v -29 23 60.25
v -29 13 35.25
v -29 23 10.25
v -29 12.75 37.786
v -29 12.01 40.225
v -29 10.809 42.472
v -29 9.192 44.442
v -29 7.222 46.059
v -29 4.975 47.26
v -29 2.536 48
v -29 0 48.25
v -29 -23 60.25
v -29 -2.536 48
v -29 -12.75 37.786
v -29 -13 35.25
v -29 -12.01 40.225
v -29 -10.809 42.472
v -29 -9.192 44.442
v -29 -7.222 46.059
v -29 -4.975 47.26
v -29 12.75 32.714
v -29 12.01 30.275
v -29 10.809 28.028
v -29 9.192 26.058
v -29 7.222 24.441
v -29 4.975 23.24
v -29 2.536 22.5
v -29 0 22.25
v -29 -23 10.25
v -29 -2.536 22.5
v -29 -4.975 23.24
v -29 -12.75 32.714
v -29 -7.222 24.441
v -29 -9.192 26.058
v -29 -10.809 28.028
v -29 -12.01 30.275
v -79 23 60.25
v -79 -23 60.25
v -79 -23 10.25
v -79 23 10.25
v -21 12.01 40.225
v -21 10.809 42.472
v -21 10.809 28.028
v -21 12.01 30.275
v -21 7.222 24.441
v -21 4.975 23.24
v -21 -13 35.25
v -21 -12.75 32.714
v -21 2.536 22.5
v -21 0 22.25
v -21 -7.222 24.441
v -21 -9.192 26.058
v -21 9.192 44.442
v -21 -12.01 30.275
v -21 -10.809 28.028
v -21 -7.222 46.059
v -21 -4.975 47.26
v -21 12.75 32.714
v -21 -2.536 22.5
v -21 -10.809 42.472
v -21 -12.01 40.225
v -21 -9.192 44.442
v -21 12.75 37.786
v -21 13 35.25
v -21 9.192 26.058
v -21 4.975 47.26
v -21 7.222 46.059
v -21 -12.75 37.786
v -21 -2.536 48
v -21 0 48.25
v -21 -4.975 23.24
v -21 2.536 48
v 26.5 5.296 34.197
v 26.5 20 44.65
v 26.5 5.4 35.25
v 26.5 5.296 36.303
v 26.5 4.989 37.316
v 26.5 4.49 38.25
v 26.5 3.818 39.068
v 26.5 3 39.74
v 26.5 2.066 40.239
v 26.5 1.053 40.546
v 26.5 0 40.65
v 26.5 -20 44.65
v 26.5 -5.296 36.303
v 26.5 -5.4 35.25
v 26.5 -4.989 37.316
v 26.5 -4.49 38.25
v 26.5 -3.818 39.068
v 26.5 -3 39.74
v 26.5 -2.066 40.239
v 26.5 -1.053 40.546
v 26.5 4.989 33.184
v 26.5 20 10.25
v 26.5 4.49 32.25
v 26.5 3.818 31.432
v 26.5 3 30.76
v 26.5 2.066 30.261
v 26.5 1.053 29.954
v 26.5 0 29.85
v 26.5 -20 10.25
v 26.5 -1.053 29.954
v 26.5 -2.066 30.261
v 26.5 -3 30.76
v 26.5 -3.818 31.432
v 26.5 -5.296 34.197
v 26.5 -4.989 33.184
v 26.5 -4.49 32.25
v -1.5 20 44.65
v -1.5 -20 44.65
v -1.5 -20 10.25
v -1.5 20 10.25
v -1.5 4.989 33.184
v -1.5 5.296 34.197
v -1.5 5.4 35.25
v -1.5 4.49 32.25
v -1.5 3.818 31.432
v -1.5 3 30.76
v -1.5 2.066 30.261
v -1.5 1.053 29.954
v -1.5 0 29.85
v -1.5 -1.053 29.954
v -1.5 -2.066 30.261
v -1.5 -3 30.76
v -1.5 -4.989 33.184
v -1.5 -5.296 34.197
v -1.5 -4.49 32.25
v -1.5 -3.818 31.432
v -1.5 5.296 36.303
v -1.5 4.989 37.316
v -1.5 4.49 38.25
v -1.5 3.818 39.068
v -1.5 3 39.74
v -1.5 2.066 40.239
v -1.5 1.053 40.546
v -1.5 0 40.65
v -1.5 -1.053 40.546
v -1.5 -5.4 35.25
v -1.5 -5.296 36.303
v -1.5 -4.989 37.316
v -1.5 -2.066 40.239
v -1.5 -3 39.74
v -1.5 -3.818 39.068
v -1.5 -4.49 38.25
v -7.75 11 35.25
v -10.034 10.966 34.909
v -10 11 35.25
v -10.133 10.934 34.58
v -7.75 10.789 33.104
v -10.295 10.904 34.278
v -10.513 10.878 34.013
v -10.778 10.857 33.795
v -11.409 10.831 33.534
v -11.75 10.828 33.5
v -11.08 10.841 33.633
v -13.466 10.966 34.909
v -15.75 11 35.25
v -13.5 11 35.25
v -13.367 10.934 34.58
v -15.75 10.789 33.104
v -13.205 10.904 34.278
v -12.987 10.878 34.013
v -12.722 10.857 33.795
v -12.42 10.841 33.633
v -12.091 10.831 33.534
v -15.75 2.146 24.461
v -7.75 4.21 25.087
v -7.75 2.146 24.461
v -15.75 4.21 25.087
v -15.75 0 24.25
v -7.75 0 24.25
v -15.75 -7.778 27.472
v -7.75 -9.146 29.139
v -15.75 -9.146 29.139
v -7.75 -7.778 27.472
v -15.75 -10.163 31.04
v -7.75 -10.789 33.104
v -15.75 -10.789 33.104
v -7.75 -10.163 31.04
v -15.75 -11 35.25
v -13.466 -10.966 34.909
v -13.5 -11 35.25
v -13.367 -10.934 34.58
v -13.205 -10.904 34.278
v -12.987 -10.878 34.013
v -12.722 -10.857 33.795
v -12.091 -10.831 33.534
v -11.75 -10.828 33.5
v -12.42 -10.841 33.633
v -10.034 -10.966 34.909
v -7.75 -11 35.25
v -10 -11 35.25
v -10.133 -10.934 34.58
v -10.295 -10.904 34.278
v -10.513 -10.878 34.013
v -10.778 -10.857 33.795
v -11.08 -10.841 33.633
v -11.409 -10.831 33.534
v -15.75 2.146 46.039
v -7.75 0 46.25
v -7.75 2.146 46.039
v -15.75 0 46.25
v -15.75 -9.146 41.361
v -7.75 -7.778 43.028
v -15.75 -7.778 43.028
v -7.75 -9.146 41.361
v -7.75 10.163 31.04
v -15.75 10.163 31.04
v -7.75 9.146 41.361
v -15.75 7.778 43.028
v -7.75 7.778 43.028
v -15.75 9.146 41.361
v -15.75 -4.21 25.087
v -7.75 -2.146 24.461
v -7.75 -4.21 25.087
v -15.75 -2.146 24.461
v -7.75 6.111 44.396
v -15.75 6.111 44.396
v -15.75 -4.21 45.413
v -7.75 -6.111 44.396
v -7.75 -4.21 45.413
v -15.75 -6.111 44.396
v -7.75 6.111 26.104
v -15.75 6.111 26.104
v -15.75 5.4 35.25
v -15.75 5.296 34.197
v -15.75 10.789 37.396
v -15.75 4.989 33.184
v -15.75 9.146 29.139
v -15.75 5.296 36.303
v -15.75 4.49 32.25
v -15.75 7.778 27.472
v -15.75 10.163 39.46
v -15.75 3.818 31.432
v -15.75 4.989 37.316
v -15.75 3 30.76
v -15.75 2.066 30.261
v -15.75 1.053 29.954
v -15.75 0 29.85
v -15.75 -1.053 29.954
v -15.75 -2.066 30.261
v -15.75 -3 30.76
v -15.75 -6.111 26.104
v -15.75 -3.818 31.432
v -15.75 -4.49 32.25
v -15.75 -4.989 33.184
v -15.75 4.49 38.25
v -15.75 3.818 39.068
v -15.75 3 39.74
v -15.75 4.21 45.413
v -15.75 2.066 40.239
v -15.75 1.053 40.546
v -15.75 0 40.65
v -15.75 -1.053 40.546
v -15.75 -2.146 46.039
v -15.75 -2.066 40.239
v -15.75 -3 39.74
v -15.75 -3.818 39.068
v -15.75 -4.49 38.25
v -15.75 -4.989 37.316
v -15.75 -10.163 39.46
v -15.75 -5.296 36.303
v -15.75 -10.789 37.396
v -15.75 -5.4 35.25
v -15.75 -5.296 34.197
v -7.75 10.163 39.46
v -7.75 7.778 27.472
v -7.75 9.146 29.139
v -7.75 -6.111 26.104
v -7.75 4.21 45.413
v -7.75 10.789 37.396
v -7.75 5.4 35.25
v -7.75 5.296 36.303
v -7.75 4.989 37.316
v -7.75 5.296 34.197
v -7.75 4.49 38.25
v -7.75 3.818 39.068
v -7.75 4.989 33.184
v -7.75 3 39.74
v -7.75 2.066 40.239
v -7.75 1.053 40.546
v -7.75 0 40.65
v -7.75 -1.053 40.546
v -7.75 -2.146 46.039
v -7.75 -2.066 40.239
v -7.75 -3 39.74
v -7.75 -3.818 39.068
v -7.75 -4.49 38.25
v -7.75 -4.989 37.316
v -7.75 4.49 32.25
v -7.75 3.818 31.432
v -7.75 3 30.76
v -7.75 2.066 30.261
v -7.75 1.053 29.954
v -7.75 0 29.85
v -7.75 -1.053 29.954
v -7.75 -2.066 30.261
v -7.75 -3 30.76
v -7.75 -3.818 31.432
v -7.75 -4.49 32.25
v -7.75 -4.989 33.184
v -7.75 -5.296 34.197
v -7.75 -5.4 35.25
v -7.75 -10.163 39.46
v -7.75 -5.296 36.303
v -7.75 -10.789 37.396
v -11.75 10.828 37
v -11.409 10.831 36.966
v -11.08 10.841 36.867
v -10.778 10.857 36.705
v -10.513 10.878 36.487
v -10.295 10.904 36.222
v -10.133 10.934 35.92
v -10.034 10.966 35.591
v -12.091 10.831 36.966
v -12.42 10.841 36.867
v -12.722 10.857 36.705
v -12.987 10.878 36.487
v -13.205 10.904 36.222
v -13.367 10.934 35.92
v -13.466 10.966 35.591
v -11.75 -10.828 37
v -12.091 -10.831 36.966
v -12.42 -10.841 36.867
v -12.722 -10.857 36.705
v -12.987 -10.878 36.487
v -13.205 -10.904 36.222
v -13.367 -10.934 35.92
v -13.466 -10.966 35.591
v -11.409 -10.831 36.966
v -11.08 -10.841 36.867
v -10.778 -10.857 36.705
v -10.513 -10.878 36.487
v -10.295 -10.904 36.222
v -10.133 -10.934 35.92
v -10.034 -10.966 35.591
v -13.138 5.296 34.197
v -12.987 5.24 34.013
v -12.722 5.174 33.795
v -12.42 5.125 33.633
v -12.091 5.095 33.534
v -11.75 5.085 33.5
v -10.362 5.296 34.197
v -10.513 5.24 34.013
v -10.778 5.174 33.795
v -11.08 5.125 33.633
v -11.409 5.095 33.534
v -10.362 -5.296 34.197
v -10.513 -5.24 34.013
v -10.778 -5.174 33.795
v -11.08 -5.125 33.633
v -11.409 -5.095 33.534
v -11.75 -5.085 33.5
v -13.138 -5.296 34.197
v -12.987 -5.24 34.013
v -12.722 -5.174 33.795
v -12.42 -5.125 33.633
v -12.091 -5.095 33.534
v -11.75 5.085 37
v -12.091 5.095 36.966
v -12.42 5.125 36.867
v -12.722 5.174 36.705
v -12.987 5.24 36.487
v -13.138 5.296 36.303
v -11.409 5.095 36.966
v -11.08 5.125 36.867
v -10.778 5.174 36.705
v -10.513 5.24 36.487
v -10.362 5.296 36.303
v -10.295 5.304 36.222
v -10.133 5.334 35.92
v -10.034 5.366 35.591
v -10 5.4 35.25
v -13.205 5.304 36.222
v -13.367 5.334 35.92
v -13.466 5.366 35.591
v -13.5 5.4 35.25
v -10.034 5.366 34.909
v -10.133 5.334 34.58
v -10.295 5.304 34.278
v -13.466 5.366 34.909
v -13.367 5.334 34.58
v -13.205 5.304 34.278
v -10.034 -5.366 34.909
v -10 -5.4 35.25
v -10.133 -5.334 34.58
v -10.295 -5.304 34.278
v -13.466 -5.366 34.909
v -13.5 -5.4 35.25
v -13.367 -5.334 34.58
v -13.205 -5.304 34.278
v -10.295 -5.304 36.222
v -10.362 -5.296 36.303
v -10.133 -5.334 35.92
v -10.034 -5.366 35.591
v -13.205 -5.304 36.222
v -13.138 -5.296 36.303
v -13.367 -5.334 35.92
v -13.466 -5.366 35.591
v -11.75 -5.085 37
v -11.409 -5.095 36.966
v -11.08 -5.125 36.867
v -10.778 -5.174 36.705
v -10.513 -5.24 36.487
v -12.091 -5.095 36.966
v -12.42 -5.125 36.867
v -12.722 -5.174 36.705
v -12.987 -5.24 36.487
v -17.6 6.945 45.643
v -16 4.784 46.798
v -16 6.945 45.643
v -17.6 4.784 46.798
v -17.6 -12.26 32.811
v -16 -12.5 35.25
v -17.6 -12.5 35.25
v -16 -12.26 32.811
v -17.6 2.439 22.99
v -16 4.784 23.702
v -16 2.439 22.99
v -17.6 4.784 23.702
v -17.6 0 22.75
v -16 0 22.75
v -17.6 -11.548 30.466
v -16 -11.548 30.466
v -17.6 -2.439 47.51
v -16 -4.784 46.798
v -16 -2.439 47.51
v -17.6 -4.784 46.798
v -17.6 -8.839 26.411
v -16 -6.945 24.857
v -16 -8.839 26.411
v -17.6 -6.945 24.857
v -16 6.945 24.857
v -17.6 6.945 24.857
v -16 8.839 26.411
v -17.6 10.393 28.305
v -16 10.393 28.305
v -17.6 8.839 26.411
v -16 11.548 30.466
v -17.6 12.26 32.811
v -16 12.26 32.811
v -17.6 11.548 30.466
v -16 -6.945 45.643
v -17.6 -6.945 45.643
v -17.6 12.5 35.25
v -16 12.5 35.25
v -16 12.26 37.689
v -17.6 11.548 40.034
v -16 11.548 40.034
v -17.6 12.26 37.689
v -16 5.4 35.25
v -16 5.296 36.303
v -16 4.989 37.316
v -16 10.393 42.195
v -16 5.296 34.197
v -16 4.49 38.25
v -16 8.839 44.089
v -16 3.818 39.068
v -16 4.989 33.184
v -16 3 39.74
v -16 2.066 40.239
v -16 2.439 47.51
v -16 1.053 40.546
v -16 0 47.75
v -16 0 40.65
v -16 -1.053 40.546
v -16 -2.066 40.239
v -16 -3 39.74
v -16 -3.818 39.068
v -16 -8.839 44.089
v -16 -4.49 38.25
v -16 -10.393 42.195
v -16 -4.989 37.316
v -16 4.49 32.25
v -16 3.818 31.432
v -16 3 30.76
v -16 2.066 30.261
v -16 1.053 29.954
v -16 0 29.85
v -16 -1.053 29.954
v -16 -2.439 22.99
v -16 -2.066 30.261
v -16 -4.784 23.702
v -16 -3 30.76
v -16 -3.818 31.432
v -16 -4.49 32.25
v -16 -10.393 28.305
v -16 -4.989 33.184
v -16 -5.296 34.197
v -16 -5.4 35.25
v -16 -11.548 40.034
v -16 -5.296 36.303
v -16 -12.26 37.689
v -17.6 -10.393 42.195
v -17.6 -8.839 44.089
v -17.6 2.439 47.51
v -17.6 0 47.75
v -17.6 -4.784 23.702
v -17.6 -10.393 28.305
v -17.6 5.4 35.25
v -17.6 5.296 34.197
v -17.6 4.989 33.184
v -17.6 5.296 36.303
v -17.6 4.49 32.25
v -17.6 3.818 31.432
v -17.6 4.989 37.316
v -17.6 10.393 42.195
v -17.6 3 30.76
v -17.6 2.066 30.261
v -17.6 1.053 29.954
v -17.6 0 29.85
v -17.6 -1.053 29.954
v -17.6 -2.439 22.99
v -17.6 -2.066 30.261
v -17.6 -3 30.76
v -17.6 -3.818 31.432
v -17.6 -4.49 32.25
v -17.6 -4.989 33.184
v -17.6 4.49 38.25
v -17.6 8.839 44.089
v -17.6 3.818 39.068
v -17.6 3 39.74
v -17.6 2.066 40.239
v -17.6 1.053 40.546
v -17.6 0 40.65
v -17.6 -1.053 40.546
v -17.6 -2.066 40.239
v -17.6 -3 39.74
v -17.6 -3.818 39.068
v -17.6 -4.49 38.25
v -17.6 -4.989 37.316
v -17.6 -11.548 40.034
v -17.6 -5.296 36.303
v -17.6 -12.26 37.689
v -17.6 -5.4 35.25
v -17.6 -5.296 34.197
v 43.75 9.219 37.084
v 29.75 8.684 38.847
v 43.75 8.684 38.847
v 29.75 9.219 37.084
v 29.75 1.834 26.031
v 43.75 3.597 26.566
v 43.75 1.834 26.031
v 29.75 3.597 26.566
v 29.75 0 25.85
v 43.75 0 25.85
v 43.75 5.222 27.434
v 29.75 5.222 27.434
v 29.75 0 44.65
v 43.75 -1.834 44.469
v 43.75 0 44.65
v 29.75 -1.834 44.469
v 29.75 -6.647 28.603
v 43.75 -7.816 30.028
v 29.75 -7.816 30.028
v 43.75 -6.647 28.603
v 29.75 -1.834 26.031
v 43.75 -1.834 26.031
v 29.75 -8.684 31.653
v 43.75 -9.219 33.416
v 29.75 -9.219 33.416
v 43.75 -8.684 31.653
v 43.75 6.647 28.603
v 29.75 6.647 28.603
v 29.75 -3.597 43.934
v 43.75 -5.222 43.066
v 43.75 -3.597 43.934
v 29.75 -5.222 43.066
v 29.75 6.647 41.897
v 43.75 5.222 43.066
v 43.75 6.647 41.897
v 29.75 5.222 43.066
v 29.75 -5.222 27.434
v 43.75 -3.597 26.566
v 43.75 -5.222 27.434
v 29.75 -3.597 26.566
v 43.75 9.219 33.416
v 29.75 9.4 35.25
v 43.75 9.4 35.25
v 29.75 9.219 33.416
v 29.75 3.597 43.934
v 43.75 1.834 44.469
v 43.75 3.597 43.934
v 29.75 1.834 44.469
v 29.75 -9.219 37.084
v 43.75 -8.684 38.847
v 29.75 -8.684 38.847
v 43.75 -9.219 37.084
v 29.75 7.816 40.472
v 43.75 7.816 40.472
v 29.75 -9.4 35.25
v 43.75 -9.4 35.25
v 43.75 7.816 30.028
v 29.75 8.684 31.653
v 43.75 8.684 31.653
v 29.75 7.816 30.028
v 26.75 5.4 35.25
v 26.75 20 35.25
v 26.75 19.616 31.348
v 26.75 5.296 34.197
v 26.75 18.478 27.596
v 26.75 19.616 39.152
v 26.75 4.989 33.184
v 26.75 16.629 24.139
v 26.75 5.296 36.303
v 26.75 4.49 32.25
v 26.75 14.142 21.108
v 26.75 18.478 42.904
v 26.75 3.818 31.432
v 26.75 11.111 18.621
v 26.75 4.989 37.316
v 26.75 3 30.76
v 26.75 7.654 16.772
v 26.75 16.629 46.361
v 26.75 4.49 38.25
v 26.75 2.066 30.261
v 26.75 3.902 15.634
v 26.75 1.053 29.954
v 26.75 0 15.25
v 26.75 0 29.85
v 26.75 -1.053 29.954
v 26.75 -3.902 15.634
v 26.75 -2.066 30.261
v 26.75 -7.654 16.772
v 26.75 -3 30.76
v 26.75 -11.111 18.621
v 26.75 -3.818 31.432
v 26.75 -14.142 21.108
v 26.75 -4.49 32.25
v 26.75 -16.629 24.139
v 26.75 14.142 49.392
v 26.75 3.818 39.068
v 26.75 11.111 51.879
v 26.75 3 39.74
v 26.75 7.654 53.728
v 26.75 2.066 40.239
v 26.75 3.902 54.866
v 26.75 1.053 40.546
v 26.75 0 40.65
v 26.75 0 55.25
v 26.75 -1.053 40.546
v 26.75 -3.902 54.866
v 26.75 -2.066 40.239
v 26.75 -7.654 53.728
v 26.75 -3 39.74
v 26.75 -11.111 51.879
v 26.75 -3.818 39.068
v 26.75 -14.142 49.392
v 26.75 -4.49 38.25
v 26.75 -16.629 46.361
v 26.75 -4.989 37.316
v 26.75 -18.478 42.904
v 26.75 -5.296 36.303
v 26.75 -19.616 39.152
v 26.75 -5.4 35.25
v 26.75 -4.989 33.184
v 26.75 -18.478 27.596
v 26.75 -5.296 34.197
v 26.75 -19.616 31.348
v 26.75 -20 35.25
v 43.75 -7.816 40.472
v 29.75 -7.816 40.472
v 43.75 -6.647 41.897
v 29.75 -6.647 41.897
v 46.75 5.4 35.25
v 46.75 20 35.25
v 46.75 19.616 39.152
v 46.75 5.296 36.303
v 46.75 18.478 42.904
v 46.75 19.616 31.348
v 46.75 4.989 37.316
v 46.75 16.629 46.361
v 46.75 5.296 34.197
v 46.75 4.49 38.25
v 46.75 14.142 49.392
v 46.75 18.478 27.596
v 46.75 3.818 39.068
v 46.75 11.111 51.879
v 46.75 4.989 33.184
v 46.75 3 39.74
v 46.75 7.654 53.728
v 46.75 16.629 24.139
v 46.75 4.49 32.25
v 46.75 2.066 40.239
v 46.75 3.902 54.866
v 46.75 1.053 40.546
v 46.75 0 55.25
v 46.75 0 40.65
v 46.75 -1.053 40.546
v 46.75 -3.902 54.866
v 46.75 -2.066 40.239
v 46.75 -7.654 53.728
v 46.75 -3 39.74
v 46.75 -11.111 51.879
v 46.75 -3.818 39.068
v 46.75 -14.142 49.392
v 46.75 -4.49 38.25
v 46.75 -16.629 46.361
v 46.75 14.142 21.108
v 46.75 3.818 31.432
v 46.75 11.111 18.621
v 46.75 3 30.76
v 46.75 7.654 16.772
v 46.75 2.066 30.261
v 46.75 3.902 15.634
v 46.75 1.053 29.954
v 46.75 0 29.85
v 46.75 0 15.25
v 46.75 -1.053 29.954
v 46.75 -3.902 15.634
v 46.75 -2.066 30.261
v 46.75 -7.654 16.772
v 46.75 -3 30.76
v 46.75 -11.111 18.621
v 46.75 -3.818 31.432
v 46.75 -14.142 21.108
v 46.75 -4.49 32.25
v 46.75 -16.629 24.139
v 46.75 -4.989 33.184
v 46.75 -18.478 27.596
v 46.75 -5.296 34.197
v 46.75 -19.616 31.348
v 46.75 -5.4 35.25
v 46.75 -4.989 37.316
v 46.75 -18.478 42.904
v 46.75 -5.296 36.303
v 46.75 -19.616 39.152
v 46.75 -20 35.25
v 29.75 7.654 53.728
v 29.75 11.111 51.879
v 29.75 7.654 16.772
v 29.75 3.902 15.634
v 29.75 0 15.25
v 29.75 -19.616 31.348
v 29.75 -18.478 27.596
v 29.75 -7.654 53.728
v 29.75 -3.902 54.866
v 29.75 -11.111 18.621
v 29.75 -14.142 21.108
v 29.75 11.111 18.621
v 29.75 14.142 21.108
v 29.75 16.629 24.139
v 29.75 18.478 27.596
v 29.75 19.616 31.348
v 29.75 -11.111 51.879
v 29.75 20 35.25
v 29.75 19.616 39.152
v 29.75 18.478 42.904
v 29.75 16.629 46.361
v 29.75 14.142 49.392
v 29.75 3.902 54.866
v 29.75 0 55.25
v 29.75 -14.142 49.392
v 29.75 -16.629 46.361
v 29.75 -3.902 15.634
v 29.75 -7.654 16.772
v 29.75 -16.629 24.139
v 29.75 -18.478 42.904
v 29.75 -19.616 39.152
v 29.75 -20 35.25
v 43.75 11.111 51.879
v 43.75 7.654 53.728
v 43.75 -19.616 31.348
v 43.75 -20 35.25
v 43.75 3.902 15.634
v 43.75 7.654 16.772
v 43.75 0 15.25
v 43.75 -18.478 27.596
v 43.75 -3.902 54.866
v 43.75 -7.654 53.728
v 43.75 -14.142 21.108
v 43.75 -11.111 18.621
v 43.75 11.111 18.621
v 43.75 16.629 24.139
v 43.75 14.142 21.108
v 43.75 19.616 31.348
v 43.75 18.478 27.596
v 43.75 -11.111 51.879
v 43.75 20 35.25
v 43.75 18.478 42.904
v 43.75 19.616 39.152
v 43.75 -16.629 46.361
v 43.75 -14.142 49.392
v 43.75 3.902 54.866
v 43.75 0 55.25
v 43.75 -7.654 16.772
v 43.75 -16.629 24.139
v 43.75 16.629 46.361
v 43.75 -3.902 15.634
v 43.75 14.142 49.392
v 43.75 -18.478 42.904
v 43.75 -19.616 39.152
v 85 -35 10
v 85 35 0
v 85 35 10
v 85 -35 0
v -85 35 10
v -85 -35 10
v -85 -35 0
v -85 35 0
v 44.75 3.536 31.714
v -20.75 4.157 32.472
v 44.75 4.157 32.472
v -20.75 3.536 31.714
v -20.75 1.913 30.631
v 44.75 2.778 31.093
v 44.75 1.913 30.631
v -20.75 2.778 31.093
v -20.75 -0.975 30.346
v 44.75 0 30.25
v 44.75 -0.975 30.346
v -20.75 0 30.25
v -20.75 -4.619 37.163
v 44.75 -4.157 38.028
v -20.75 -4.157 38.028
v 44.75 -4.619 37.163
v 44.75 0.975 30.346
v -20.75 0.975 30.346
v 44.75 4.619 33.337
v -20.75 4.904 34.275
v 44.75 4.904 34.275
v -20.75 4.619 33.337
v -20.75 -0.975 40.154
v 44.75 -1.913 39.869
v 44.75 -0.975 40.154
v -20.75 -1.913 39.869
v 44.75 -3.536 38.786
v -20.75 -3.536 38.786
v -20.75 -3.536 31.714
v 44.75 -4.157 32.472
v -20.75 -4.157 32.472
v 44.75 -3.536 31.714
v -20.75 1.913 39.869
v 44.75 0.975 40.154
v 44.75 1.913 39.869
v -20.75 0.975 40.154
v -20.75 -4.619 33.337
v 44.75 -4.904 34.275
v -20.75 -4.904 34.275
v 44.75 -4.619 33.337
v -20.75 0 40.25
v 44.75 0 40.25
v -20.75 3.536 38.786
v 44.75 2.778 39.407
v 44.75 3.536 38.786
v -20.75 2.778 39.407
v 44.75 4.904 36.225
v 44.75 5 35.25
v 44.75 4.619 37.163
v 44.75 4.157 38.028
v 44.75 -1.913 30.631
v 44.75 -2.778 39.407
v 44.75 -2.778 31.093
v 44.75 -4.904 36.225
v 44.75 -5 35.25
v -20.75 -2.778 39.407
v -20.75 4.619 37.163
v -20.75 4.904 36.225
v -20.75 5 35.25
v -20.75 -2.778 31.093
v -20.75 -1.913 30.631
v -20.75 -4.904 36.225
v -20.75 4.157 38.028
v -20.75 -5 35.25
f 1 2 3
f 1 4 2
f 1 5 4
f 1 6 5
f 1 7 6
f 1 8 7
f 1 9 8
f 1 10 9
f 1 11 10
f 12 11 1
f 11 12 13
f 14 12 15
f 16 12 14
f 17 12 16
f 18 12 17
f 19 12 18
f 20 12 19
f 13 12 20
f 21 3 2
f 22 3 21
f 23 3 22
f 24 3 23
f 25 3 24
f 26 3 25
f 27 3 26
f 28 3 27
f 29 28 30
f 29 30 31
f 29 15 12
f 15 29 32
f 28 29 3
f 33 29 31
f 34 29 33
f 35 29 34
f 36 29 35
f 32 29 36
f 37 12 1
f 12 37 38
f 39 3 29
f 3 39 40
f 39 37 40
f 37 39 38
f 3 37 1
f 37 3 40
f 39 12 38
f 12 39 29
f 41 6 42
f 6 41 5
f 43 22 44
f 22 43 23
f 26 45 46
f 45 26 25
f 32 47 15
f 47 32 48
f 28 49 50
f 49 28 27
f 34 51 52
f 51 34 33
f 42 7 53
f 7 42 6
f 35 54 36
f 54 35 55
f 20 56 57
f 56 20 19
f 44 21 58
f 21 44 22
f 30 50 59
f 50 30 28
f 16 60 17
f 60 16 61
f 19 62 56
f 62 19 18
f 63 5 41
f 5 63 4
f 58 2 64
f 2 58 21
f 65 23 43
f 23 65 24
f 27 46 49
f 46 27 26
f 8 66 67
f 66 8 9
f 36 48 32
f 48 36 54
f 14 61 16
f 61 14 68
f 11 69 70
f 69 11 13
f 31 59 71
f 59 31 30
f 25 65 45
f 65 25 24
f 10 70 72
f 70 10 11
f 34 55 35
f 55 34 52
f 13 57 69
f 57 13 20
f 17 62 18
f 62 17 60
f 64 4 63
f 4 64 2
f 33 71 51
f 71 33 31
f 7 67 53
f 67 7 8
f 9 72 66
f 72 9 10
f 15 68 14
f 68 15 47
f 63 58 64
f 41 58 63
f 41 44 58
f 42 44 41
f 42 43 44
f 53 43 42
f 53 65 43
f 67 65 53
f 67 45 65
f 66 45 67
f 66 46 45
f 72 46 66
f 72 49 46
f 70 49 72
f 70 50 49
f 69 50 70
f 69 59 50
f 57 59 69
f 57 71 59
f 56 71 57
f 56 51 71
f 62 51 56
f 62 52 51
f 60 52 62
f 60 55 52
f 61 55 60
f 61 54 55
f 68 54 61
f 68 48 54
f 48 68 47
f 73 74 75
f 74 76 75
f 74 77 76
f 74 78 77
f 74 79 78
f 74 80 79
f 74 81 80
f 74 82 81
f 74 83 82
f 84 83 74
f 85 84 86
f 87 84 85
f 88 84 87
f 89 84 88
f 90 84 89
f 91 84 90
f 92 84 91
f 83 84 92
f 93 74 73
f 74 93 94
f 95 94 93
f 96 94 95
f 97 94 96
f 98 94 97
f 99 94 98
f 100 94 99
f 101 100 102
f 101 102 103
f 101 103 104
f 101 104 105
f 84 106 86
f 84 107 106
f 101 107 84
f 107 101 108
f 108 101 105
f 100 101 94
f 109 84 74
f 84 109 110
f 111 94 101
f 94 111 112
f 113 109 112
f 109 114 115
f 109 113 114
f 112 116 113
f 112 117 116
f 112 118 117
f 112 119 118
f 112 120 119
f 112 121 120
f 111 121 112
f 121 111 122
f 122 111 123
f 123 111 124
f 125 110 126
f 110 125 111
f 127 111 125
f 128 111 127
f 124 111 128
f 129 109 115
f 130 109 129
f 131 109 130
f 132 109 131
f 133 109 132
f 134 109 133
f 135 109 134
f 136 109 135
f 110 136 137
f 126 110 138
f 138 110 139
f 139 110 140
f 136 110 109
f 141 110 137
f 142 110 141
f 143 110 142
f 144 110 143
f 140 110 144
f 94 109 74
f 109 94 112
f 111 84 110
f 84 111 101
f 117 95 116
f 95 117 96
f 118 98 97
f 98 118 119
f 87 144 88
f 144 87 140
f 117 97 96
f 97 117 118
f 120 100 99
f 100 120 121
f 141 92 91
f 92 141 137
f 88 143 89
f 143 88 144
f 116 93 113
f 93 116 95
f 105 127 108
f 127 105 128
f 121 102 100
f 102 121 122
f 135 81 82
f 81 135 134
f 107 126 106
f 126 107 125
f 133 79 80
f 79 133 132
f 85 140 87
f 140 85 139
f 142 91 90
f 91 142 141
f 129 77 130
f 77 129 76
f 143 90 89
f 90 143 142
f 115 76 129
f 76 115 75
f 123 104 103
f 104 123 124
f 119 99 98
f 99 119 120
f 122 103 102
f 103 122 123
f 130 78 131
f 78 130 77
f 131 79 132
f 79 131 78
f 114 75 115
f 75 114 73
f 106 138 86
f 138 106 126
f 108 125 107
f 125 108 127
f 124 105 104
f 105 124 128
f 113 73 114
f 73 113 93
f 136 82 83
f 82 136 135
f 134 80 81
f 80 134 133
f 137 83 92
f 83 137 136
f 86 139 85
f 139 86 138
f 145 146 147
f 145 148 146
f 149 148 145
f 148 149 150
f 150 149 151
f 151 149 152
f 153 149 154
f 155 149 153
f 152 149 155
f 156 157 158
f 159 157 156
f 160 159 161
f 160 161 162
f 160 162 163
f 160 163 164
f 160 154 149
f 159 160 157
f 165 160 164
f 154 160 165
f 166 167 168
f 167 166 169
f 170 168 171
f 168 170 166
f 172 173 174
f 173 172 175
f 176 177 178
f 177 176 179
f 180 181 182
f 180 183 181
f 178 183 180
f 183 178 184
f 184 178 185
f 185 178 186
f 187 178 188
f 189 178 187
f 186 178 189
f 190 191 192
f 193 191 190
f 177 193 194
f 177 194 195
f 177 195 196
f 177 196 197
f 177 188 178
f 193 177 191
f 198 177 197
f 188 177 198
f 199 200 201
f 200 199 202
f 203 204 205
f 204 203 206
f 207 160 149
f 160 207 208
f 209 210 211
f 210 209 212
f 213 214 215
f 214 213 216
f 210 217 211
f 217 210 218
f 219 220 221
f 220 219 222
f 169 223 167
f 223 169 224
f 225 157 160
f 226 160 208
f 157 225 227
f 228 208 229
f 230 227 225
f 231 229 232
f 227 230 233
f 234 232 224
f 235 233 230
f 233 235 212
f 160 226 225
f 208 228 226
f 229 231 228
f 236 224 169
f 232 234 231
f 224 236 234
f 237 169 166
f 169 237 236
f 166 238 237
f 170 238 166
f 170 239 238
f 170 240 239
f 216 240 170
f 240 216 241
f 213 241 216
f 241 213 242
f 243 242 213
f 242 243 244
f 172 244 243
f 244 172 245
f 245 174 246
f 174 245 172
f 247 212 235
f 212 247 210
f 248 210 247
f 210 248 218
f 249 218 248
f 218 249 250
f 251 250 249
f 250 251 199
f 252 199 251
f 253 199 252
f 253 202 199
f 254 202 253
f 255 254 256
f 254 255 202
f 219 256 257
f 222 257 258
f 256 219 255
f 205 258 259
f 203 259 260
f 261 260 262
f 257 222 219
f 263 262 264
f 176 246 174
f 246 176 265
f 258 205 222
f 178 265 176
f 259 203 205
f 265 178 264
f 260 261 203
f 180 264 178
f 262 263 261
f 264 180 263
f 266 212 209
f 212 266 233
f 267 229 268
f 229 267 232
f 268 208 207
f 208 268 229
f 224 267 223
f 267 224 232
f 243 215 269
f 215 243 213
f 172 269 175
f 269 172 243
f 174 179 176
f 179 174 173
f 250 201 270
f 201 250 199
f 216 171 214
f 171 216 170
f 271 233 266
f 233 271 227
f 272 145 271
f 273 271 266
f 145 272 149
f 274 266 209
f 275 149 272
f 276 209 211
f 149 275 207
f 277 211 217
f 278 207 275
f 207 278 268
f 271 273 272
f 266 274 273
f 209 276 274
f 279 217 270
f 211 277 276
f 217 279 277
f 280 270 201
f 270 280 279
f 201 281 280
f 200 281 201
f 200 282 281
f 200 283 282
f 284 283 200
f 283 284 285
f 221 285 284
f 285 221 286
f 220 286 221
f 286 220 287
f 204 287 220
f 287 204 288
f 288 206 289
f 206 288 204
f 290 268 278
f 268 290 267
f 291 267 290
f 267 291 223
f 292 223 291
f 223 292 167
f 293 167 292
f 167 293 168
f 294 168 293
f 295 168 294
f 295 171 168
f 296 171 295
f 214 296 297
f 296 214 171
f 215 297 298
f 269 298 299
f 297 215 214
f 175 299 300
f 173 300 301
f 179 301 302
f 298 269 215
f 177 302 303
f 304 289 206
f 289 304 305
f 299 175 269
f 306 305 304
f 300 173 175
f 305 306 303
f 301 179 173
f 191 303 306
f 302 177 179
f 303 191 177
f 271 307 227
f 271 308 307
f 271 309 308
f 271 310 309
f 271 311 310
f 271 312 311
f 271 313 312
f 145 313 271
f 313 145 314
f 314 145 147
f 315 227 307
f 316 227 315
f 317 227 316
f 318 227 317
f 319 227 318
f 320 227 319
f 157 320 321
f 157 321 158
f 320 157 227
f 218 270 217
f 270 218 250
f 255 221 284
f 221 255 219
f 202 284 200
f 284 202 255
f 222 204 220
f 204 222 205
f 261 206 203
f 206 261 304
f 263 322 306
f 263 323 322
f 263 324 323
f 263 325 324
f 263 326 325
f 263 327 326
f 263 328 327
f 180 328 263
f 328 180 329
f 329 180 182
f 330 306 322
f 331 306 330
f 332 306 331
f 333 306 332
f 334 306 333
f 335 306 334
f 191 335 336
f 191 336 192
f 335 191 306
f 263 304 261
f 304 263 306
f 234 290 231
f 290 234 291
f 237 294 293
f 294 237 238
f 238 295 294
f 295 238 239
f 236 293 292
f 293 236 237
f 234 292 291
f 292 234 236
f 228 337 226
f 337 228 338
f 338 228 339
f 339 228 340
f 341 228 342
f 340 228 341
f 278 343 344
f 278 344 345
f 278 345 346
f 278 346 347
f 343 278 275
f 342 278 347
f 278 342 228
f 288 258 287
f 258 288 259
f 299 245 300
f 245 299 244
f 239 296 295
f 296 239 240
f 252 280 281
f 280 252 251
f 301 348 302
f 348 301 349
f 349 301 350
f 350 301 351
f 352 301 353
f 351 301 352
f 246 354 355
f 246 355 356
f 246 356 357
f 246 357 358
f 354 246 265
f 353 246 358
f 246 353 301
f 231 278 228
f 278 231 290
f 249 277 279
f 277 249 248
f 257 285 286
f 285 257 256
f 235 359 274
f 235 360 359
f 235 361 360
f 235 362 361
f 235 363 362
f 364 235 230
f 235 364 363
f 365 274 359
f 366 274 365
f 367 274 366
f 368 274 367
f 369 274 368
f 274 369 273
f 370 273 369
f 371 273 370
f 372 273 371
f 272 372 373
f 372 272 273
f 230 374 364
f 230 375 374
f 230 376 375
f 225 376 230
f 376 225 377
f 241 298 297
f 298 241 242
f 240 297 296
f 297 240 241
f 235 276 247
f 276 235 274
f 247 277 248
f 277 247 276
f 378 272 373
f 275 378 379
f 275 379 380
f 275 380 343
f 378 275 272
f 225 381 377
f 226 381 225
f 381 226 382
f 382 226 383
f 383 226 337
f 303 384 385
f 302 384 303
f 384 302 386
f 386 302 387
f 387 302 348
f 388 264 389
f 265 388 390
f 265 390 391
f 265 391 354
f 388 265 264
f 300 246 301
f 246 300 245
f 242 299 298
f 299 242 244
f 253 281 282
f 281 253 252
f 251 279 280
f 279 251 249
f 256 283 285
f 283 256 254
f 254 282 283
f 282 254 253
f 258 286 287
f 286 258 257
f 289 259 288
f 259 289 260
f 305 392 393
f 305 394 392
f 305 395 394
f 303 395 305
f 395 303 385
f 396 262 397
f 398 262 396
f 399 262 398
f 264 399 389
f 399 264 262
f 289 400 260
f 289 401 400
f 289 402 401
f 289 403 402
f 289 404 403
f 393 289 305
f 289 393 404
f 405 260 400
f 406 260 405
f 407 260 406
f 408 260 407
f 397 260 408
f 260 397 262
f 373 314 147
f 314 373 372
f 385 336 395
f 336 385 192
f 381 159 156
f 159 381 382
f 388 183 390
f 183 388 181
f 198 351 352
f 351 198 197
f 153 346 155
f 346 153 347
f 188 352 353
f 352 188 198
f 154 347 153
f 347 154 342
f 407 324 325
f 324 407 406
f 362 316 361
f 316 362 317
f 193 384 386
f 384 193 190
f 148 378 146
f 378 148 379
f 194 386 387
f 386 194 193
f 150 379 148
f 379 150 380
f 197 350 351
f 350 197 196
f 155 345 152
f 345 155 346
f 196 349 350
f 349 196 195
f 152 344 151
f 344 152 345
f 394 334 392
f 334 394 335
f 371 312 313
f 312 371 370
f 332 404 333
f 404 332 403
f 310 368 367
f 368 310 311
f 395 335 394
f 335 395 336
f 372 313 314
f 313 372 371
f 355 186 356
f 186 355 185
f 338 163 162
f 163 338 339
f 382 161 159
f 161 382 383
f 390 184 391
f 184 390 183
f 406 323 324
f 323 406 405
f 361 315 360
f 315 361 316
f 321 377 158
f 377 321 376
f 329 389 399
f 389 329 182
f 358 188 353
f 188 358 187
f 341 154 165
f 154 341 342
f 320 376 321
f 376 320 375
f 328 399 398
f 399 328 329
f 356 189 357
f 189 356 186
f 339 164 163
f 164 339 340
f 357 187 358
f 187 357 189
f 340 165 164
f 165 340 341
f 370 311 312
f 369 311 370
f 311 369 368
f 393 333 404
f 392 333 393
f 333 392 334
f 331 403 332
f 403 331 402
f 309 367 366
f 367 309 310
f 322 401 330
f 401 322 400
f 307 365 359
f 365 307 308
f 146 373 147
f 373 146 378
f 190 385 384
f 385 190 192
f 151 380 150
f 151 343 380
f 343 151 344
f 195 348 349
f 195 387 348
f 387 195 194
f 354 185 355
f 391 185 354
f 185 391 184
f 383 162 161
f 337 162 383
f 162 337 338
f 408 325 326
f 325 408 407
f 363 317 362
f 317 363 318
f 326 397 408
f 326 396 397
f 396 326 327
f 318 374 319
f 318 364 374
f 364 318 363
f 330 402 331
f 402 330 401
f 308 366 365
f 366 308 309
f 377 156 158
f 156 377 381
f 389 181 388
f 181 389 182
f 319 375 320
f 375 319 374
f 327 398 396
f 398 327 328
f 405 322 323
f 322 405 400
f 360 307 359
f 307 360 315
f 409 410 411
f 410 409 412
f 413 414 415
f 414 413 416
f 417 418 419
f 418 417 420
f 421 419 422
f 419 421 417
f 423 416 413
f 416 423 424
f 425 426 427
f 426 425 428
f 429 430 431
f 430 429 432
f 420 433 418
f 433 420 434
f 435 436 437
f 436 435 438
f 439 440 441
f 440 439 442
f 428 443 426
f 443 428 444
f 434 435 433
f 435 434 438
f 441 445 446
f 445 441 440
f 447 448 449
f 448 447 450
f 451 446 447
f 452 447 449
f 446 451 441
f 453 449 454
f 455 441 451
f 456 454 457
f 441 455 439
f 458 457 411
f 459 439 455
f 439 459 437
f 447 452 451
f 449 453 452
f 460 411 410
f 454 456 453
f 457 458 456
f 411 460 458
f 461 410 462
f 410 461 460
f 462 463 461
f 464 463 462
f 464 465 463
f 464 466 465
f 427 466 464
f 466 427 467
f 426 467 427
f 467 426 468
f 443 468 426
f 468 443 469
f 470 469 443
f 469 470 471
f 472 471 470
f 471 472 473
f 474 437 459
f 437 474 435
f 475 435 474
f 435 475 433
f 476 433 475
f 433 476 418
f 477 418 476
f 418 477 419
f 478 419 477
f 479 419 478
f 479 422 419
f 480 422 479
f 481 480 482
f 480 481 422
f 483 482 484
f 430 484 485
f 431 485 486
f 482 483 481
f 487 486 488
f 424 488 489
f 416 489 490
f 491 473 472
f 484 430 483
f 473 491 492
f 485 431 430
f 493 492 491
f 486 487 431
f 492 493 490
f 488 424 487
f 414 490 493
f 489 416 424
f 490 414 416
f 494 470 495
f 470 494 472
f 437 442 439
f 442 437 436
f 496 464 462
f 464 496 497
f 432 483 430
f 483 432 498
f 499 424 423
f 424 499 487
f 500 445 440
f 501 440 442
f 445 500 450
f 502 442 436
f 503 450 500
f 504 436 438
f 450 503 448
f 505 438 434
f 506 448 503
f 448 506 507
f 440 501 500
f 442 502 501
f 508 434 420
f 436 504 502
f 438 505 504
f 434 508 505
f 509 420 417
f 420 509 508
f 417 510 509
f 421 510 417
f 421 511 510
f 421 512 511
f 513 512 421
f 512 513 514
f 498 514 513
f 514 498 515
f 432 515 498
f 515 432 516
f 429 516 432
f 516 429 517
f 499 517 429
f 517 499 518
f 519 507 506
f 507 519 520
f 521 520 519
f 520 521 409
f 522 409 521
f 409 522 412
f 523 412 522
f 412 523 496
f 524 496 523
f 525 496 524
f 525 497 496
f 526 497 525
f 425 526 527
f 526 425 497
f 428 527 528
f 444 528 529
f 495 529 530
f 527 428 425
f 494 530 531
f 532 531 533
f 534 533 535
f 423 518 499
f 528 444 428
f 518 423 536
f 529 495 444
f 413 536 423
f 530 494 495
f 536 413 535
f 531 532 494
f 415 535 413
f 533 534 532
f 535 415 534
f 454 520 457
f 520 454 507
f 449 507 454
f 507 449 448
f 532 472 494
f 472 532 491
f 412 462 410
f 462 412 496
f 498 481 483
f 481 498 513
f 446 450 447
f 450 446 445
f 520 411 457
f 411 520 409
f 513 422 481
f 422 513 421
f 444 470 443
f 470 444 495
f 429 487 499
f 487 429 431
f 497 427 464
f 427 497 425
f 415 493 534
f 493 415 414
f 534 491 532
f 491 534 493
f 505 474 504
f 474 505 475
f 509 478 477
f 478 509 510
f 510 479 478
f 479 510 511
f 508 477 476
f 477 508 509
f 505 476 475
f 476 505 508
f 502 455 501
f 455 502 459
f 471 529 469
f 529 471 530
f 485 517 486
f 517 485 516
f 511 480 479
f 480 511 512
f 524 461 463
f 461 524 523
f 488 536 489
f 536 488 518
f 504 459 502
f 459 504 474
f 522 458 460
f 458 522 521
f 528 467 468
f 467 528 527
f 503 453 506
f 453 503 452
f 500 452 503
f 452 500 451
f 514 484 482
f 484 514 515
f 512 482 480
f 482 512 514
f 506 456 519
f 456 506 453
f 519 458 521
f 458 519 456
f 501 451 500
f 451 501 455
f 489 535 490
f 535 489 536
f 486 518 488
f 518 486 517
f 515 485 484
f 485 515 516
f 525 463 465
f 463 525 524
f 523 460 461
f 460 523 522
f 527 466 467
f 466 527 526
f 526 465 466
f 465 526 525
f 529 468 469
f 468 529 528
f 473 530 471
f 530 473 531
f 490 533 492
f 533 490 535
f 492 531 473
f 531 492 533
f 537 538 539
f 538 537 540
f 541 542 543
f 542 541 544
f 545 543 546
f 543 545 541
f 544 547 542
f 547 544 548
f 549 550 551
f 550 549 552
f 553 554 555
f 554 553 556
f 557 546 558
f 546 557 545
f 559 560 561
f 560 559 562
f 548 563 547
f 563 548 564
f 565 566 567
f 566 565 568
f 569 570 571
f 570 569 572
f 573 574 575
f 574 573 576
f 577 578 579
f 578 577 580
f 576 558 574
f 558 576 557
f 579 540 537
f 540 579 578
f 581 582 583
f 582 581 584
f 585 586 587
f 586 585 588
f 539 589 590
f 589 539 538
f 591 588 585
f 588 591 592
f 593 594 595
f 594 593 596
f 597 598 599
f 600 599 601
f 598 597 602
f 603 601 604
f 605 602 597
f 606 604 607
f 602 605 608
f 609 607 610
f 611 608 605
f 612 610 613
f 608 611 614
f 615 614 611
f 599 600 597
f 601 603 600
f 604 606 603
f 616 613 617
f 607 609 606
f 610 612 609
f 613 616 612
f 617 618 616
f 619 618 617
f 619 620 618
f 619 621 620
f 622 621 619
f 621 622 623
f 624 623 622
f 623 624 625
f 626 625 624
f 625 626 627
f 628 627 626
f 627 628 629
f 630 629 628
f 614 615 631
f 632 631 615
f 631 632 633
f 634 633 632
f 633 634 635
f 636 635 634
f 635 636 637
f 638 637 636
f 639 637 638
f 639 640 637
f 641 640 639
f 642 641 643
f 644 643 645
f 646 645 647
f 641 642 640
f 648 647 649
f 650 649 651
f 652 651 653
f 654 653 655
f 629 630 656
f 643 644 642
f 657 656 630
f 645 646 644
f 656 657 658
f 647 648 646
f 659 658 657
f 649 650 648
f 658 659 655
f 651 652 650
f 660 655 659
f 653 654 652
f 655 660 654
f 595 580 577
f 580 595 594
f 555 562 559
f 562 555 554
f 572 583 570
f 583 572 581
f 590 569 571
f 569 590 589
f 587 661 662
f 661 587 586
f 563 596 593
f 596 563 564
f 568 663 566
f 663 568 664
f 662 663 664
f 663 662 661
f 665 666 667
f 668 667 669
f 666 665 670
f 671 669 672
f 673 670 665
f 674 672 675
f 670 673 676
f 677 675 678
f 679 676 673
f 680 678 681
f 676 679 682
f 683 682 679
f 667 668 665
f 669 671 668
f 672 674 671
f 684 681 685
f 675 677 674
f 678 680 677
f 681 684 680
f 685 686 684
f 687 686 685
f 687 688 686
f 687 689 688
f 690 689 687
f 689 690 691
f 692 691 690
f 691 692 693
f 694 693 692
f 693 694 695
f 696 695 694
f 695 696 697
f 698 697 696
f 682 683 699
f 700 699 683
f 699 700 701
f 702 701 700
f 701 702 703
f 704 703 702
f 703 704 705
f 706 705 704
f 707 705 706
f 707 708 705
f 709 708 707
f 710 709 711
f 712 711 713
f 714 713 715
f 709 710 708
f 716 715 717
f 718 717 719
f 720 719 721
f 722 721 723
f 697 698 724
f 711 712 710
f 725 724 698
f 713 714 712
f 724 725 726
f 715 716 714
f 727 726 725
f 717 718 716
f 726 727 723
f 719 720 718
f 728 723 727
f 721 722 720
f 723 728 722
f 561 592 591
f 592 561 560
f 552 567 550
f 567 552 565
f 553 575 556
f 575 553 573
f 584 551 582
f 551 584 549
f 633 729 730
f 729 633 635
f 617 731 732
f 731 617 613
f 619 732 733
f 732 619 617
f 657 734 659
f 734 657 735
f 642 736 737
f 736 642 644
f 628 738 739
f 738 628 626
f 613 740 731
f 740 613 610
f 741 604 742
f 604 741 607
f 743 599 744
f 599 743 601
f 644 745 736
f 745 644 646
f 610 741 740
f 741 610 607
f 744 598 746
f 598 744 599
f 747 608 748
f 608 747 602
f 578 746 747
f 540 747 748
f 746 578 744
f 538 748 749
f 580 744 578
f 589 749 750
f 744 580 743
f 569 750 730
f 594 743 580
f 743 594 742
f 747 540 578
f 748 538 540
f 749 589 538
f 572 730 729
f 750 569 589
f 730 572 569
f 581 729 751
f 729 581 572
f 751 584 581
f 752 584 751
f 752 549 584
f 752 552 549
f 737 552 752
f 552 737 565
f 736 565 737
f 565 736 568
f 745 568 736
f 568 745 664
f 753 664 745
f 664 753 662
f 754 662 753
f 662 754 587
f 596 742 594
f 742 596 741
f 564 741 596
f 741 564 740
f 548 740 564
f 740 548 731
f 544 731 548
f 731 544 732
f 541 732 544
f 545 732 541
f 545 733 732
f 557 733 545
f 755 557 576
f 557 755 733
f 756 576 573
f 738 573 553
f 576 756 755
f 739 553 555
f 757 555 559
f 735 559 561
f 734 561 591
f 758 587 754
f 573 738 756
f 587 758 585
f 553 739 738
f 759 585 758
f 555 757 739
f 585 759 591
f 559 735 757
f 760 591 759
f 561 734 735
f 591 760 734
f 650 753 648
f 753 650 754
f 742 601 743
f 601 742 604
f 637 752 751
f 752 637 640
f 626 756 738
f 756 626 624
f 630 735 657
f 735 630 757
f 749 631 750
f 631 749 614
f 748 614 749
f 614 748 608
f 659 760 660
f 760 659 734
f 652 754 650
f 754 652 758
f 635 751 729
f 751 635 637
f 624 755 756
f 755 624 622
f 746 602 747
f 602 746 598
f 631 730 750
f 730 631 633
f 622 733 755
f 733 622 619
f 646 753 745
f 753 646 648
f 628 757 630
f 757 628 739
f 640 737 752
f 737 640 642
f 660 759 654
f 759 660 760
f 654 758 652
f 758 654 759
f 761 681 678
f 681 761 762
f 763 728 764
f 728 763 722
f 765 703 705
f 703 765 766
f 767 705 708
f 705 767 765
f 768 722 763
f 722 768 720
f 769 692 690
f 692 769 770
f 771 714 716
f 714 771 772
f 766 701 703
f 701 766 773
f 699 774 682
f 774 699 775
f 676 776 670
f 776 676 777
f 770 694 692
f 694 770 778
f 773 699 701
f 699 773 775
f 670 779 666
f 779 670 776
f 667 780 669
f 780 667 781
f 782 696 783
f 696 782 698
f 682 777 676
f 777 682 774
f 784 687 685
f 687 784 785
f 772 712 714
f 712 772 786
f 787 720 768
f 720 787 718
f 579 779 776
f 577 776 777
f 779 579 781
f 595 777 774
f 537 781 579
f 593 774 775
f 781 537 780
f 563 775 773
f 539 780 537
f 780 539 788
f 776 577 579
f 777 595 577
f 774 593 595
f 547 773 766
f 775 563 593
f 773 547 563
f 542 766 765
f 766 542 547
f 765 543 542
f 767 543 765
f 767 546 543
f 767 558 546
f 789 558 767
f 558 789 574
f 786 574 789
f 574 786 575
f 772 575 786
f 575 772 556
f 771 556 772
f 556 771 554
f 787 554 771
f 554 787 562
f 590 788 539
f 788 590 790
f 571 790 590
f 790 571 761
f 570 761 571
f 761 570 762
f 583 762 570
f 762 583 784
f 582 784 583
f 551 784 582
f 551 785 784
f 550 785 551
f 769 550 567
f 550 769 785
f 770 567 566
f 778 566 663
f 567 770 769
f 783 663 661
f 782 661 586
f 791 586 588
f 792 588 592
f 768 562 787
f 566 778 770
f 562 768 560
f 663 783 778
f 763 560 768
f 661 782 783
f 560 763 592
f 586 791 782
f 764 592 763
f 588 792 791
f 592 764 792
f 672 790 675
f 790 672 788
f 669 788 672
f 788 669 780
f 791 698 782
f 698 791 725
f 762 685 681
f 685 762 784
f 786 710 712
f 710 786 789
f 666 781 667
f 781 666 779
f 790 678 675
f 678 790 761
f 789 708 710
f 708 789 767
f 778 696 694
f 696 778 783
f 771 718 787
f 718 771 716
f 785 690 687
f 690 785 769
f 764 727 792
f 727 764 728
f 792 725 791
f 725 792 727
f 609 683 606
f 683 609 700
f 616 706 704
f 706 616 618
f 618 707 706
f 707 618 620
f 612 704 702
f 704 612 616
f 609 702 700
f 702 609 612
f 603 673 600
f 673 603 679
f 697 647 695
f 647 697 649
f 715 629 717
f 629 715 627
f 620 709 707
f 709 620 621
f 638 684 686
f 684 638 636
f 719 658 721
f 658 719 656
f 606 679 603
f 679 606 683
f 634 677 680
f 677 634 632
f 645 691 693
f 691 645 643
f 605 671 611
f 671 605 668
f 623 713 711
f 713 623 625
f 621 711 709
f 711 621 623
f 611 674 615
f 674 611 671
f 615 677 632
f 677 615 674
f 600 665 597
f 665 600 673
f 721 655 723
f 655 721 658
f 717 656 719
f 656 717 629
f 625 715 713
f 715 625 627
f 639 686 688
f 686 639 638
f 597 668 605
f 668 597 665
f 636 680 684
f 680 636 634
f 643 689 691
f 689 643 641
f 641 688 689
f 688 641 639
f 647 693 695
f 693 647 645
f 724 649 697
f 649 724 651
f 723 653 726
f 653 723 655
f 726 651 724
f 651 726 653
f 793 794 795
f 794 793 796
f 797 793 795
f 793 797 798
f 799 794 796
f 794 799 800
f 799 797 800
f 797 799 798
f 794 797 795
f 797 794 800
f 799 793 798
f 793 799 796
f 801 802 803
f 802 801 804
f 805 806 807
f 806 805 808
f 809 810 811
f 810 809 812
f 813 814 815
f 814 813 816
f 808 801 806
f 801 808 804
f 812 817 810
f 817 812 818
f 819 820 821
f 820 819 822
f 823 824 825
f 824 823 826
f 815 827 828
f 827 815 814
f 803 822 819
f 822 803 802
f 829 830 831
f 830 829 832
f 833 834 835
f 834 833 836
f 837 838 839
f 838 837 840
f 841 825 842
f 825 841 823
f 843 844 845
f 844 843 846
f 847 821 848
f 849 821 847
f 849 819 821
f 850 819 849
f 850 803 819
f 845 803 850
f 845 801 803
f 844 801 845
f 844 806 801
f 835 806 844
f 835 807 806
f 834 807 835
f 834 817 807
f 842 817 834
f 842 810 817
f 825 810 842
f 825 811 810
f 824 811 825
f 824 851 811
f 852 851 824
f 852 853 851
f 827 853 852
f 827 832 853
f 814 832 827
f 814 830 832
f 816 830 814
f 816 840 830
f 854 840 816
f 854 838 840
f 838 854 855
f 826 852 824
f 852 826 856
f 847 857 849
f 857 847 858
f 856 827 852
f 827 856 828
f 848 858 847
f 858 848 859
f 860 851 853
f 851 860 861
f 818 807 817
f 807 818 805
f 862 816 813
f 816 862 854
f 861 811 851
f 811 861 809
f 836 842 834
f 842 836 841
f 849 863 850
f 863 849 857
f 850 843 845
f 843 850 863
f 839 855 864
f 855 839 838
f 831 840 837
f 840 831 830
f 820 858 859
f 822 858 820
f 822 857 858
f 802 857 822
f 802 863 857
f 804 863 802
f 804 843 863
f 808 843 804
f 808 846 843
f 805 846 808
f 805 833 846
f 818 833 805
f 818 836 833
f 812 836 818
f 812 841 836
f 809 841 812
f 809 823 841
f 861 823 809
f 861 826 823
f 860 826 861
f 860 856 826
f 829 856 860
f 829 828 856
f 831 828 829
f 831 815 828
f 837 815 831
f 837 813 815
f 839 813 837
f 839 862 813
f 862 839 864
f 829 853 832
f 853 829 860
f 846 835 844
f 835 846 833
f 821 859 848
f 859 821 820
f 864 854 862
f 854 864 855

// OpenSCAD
$fn = 32;

// ------------------------------------------------------------------------
// Motor drive station: motor 50 x 50 mm, shaft d10, pulley d40
// Every part is its own module, assembly() places every instance.
// ------------------------------------------------------------------------

// --- part 1 ---
module station_bed() {
  difference() {
    translate([-85, -35, 0]) cube([170, 70, 10]);
  }
}

// --- part 2 ---
module drive_motor() {
  union() {
    translate([-25, -23, 0]) cube([50, 46, 50]);
    translate([29, 0, 25]) rotate([0, 90, 0]) cylinder(h = 8, d = 26, center = true);
  }
}

// --- part 3 ---
module pillow_block() {
  difference() {
    translate([-14, -20, 0]) cube([28, 40, 34.4]);
    translate([0, 0, 25]) rotate([0, 90, 0]) cylinder(h = 30, d = 10.8, center = true);
  }
}

// --- part 4 ---
module drive_shaft() {
  translate([0, 0, -32.75]) cylinder(h = 65.5, d = 10);
}

// --- part 5 ---
module shaft_collar() {
  difference() {
    cylinder(h = 8, d = 22);
    translate([0, 0, -1]) cylinder(h = 10, d = 10.8);
    translate([0, 0, 4]) rotate([90, 0, 0]) cylinder(h = 24, d = 3.5, center = true);
  }
}

// --- part 6 ---
module collar_washer() {
  difference() {
      translate([0, 0, 0]) cylinder(h = 1.6, d = 25);
      translate([0, 0, -1]) cylinder(h = 3.6, d = 10.8);
    }
}

// --- part 7 ---
module drive_pulley() {
  difference() {
    union() {
      cylinder(h = 20, d = 18.8);
      cylinder(h = 3, d = 40);
      translate([0, 0, 17]) cylinder(h = 3, d = 40);
    }
    translate([0, 0, -1]) cylinder(h = 22, d = 10.8);
  }
}

// --- assembly ---
module assembly() {
  color([0.80, 0.24, 0.20]) translate([0, 0, 0]) rotate([0, 0, 0]) station_bed();
  color([0.20, 0.45, 0.75]) translate([-54, 0, 10.25]) rotate([0, 0, 0]) drive_motor();
  color([0.25, 0.62, 0.32]) translate([12.5, 0, 10.25]) rotate([0, 0, 0]) pillow_block();
  color([0.92, 0.70, 0.18]) translate([12, 0, 35.25]) rotate([0, 90, 0]) drive_shaft();
  color([0.58, 0.35, 0.70]) translate([-15.75, 0, 35.25]) rotate([0, 90, 0]) shaft_collar();
  color([0.16, 0.66, 0.66]) translate([-17.6, 0, 35.25]) rotate([0, 90, 0]) collar_washer();
  color([0.85, 0.48, 0.18]) translate([26.75, 0, 35.25]) rotate([0, 90, 0]) drive_pulley();
}

assembly();
